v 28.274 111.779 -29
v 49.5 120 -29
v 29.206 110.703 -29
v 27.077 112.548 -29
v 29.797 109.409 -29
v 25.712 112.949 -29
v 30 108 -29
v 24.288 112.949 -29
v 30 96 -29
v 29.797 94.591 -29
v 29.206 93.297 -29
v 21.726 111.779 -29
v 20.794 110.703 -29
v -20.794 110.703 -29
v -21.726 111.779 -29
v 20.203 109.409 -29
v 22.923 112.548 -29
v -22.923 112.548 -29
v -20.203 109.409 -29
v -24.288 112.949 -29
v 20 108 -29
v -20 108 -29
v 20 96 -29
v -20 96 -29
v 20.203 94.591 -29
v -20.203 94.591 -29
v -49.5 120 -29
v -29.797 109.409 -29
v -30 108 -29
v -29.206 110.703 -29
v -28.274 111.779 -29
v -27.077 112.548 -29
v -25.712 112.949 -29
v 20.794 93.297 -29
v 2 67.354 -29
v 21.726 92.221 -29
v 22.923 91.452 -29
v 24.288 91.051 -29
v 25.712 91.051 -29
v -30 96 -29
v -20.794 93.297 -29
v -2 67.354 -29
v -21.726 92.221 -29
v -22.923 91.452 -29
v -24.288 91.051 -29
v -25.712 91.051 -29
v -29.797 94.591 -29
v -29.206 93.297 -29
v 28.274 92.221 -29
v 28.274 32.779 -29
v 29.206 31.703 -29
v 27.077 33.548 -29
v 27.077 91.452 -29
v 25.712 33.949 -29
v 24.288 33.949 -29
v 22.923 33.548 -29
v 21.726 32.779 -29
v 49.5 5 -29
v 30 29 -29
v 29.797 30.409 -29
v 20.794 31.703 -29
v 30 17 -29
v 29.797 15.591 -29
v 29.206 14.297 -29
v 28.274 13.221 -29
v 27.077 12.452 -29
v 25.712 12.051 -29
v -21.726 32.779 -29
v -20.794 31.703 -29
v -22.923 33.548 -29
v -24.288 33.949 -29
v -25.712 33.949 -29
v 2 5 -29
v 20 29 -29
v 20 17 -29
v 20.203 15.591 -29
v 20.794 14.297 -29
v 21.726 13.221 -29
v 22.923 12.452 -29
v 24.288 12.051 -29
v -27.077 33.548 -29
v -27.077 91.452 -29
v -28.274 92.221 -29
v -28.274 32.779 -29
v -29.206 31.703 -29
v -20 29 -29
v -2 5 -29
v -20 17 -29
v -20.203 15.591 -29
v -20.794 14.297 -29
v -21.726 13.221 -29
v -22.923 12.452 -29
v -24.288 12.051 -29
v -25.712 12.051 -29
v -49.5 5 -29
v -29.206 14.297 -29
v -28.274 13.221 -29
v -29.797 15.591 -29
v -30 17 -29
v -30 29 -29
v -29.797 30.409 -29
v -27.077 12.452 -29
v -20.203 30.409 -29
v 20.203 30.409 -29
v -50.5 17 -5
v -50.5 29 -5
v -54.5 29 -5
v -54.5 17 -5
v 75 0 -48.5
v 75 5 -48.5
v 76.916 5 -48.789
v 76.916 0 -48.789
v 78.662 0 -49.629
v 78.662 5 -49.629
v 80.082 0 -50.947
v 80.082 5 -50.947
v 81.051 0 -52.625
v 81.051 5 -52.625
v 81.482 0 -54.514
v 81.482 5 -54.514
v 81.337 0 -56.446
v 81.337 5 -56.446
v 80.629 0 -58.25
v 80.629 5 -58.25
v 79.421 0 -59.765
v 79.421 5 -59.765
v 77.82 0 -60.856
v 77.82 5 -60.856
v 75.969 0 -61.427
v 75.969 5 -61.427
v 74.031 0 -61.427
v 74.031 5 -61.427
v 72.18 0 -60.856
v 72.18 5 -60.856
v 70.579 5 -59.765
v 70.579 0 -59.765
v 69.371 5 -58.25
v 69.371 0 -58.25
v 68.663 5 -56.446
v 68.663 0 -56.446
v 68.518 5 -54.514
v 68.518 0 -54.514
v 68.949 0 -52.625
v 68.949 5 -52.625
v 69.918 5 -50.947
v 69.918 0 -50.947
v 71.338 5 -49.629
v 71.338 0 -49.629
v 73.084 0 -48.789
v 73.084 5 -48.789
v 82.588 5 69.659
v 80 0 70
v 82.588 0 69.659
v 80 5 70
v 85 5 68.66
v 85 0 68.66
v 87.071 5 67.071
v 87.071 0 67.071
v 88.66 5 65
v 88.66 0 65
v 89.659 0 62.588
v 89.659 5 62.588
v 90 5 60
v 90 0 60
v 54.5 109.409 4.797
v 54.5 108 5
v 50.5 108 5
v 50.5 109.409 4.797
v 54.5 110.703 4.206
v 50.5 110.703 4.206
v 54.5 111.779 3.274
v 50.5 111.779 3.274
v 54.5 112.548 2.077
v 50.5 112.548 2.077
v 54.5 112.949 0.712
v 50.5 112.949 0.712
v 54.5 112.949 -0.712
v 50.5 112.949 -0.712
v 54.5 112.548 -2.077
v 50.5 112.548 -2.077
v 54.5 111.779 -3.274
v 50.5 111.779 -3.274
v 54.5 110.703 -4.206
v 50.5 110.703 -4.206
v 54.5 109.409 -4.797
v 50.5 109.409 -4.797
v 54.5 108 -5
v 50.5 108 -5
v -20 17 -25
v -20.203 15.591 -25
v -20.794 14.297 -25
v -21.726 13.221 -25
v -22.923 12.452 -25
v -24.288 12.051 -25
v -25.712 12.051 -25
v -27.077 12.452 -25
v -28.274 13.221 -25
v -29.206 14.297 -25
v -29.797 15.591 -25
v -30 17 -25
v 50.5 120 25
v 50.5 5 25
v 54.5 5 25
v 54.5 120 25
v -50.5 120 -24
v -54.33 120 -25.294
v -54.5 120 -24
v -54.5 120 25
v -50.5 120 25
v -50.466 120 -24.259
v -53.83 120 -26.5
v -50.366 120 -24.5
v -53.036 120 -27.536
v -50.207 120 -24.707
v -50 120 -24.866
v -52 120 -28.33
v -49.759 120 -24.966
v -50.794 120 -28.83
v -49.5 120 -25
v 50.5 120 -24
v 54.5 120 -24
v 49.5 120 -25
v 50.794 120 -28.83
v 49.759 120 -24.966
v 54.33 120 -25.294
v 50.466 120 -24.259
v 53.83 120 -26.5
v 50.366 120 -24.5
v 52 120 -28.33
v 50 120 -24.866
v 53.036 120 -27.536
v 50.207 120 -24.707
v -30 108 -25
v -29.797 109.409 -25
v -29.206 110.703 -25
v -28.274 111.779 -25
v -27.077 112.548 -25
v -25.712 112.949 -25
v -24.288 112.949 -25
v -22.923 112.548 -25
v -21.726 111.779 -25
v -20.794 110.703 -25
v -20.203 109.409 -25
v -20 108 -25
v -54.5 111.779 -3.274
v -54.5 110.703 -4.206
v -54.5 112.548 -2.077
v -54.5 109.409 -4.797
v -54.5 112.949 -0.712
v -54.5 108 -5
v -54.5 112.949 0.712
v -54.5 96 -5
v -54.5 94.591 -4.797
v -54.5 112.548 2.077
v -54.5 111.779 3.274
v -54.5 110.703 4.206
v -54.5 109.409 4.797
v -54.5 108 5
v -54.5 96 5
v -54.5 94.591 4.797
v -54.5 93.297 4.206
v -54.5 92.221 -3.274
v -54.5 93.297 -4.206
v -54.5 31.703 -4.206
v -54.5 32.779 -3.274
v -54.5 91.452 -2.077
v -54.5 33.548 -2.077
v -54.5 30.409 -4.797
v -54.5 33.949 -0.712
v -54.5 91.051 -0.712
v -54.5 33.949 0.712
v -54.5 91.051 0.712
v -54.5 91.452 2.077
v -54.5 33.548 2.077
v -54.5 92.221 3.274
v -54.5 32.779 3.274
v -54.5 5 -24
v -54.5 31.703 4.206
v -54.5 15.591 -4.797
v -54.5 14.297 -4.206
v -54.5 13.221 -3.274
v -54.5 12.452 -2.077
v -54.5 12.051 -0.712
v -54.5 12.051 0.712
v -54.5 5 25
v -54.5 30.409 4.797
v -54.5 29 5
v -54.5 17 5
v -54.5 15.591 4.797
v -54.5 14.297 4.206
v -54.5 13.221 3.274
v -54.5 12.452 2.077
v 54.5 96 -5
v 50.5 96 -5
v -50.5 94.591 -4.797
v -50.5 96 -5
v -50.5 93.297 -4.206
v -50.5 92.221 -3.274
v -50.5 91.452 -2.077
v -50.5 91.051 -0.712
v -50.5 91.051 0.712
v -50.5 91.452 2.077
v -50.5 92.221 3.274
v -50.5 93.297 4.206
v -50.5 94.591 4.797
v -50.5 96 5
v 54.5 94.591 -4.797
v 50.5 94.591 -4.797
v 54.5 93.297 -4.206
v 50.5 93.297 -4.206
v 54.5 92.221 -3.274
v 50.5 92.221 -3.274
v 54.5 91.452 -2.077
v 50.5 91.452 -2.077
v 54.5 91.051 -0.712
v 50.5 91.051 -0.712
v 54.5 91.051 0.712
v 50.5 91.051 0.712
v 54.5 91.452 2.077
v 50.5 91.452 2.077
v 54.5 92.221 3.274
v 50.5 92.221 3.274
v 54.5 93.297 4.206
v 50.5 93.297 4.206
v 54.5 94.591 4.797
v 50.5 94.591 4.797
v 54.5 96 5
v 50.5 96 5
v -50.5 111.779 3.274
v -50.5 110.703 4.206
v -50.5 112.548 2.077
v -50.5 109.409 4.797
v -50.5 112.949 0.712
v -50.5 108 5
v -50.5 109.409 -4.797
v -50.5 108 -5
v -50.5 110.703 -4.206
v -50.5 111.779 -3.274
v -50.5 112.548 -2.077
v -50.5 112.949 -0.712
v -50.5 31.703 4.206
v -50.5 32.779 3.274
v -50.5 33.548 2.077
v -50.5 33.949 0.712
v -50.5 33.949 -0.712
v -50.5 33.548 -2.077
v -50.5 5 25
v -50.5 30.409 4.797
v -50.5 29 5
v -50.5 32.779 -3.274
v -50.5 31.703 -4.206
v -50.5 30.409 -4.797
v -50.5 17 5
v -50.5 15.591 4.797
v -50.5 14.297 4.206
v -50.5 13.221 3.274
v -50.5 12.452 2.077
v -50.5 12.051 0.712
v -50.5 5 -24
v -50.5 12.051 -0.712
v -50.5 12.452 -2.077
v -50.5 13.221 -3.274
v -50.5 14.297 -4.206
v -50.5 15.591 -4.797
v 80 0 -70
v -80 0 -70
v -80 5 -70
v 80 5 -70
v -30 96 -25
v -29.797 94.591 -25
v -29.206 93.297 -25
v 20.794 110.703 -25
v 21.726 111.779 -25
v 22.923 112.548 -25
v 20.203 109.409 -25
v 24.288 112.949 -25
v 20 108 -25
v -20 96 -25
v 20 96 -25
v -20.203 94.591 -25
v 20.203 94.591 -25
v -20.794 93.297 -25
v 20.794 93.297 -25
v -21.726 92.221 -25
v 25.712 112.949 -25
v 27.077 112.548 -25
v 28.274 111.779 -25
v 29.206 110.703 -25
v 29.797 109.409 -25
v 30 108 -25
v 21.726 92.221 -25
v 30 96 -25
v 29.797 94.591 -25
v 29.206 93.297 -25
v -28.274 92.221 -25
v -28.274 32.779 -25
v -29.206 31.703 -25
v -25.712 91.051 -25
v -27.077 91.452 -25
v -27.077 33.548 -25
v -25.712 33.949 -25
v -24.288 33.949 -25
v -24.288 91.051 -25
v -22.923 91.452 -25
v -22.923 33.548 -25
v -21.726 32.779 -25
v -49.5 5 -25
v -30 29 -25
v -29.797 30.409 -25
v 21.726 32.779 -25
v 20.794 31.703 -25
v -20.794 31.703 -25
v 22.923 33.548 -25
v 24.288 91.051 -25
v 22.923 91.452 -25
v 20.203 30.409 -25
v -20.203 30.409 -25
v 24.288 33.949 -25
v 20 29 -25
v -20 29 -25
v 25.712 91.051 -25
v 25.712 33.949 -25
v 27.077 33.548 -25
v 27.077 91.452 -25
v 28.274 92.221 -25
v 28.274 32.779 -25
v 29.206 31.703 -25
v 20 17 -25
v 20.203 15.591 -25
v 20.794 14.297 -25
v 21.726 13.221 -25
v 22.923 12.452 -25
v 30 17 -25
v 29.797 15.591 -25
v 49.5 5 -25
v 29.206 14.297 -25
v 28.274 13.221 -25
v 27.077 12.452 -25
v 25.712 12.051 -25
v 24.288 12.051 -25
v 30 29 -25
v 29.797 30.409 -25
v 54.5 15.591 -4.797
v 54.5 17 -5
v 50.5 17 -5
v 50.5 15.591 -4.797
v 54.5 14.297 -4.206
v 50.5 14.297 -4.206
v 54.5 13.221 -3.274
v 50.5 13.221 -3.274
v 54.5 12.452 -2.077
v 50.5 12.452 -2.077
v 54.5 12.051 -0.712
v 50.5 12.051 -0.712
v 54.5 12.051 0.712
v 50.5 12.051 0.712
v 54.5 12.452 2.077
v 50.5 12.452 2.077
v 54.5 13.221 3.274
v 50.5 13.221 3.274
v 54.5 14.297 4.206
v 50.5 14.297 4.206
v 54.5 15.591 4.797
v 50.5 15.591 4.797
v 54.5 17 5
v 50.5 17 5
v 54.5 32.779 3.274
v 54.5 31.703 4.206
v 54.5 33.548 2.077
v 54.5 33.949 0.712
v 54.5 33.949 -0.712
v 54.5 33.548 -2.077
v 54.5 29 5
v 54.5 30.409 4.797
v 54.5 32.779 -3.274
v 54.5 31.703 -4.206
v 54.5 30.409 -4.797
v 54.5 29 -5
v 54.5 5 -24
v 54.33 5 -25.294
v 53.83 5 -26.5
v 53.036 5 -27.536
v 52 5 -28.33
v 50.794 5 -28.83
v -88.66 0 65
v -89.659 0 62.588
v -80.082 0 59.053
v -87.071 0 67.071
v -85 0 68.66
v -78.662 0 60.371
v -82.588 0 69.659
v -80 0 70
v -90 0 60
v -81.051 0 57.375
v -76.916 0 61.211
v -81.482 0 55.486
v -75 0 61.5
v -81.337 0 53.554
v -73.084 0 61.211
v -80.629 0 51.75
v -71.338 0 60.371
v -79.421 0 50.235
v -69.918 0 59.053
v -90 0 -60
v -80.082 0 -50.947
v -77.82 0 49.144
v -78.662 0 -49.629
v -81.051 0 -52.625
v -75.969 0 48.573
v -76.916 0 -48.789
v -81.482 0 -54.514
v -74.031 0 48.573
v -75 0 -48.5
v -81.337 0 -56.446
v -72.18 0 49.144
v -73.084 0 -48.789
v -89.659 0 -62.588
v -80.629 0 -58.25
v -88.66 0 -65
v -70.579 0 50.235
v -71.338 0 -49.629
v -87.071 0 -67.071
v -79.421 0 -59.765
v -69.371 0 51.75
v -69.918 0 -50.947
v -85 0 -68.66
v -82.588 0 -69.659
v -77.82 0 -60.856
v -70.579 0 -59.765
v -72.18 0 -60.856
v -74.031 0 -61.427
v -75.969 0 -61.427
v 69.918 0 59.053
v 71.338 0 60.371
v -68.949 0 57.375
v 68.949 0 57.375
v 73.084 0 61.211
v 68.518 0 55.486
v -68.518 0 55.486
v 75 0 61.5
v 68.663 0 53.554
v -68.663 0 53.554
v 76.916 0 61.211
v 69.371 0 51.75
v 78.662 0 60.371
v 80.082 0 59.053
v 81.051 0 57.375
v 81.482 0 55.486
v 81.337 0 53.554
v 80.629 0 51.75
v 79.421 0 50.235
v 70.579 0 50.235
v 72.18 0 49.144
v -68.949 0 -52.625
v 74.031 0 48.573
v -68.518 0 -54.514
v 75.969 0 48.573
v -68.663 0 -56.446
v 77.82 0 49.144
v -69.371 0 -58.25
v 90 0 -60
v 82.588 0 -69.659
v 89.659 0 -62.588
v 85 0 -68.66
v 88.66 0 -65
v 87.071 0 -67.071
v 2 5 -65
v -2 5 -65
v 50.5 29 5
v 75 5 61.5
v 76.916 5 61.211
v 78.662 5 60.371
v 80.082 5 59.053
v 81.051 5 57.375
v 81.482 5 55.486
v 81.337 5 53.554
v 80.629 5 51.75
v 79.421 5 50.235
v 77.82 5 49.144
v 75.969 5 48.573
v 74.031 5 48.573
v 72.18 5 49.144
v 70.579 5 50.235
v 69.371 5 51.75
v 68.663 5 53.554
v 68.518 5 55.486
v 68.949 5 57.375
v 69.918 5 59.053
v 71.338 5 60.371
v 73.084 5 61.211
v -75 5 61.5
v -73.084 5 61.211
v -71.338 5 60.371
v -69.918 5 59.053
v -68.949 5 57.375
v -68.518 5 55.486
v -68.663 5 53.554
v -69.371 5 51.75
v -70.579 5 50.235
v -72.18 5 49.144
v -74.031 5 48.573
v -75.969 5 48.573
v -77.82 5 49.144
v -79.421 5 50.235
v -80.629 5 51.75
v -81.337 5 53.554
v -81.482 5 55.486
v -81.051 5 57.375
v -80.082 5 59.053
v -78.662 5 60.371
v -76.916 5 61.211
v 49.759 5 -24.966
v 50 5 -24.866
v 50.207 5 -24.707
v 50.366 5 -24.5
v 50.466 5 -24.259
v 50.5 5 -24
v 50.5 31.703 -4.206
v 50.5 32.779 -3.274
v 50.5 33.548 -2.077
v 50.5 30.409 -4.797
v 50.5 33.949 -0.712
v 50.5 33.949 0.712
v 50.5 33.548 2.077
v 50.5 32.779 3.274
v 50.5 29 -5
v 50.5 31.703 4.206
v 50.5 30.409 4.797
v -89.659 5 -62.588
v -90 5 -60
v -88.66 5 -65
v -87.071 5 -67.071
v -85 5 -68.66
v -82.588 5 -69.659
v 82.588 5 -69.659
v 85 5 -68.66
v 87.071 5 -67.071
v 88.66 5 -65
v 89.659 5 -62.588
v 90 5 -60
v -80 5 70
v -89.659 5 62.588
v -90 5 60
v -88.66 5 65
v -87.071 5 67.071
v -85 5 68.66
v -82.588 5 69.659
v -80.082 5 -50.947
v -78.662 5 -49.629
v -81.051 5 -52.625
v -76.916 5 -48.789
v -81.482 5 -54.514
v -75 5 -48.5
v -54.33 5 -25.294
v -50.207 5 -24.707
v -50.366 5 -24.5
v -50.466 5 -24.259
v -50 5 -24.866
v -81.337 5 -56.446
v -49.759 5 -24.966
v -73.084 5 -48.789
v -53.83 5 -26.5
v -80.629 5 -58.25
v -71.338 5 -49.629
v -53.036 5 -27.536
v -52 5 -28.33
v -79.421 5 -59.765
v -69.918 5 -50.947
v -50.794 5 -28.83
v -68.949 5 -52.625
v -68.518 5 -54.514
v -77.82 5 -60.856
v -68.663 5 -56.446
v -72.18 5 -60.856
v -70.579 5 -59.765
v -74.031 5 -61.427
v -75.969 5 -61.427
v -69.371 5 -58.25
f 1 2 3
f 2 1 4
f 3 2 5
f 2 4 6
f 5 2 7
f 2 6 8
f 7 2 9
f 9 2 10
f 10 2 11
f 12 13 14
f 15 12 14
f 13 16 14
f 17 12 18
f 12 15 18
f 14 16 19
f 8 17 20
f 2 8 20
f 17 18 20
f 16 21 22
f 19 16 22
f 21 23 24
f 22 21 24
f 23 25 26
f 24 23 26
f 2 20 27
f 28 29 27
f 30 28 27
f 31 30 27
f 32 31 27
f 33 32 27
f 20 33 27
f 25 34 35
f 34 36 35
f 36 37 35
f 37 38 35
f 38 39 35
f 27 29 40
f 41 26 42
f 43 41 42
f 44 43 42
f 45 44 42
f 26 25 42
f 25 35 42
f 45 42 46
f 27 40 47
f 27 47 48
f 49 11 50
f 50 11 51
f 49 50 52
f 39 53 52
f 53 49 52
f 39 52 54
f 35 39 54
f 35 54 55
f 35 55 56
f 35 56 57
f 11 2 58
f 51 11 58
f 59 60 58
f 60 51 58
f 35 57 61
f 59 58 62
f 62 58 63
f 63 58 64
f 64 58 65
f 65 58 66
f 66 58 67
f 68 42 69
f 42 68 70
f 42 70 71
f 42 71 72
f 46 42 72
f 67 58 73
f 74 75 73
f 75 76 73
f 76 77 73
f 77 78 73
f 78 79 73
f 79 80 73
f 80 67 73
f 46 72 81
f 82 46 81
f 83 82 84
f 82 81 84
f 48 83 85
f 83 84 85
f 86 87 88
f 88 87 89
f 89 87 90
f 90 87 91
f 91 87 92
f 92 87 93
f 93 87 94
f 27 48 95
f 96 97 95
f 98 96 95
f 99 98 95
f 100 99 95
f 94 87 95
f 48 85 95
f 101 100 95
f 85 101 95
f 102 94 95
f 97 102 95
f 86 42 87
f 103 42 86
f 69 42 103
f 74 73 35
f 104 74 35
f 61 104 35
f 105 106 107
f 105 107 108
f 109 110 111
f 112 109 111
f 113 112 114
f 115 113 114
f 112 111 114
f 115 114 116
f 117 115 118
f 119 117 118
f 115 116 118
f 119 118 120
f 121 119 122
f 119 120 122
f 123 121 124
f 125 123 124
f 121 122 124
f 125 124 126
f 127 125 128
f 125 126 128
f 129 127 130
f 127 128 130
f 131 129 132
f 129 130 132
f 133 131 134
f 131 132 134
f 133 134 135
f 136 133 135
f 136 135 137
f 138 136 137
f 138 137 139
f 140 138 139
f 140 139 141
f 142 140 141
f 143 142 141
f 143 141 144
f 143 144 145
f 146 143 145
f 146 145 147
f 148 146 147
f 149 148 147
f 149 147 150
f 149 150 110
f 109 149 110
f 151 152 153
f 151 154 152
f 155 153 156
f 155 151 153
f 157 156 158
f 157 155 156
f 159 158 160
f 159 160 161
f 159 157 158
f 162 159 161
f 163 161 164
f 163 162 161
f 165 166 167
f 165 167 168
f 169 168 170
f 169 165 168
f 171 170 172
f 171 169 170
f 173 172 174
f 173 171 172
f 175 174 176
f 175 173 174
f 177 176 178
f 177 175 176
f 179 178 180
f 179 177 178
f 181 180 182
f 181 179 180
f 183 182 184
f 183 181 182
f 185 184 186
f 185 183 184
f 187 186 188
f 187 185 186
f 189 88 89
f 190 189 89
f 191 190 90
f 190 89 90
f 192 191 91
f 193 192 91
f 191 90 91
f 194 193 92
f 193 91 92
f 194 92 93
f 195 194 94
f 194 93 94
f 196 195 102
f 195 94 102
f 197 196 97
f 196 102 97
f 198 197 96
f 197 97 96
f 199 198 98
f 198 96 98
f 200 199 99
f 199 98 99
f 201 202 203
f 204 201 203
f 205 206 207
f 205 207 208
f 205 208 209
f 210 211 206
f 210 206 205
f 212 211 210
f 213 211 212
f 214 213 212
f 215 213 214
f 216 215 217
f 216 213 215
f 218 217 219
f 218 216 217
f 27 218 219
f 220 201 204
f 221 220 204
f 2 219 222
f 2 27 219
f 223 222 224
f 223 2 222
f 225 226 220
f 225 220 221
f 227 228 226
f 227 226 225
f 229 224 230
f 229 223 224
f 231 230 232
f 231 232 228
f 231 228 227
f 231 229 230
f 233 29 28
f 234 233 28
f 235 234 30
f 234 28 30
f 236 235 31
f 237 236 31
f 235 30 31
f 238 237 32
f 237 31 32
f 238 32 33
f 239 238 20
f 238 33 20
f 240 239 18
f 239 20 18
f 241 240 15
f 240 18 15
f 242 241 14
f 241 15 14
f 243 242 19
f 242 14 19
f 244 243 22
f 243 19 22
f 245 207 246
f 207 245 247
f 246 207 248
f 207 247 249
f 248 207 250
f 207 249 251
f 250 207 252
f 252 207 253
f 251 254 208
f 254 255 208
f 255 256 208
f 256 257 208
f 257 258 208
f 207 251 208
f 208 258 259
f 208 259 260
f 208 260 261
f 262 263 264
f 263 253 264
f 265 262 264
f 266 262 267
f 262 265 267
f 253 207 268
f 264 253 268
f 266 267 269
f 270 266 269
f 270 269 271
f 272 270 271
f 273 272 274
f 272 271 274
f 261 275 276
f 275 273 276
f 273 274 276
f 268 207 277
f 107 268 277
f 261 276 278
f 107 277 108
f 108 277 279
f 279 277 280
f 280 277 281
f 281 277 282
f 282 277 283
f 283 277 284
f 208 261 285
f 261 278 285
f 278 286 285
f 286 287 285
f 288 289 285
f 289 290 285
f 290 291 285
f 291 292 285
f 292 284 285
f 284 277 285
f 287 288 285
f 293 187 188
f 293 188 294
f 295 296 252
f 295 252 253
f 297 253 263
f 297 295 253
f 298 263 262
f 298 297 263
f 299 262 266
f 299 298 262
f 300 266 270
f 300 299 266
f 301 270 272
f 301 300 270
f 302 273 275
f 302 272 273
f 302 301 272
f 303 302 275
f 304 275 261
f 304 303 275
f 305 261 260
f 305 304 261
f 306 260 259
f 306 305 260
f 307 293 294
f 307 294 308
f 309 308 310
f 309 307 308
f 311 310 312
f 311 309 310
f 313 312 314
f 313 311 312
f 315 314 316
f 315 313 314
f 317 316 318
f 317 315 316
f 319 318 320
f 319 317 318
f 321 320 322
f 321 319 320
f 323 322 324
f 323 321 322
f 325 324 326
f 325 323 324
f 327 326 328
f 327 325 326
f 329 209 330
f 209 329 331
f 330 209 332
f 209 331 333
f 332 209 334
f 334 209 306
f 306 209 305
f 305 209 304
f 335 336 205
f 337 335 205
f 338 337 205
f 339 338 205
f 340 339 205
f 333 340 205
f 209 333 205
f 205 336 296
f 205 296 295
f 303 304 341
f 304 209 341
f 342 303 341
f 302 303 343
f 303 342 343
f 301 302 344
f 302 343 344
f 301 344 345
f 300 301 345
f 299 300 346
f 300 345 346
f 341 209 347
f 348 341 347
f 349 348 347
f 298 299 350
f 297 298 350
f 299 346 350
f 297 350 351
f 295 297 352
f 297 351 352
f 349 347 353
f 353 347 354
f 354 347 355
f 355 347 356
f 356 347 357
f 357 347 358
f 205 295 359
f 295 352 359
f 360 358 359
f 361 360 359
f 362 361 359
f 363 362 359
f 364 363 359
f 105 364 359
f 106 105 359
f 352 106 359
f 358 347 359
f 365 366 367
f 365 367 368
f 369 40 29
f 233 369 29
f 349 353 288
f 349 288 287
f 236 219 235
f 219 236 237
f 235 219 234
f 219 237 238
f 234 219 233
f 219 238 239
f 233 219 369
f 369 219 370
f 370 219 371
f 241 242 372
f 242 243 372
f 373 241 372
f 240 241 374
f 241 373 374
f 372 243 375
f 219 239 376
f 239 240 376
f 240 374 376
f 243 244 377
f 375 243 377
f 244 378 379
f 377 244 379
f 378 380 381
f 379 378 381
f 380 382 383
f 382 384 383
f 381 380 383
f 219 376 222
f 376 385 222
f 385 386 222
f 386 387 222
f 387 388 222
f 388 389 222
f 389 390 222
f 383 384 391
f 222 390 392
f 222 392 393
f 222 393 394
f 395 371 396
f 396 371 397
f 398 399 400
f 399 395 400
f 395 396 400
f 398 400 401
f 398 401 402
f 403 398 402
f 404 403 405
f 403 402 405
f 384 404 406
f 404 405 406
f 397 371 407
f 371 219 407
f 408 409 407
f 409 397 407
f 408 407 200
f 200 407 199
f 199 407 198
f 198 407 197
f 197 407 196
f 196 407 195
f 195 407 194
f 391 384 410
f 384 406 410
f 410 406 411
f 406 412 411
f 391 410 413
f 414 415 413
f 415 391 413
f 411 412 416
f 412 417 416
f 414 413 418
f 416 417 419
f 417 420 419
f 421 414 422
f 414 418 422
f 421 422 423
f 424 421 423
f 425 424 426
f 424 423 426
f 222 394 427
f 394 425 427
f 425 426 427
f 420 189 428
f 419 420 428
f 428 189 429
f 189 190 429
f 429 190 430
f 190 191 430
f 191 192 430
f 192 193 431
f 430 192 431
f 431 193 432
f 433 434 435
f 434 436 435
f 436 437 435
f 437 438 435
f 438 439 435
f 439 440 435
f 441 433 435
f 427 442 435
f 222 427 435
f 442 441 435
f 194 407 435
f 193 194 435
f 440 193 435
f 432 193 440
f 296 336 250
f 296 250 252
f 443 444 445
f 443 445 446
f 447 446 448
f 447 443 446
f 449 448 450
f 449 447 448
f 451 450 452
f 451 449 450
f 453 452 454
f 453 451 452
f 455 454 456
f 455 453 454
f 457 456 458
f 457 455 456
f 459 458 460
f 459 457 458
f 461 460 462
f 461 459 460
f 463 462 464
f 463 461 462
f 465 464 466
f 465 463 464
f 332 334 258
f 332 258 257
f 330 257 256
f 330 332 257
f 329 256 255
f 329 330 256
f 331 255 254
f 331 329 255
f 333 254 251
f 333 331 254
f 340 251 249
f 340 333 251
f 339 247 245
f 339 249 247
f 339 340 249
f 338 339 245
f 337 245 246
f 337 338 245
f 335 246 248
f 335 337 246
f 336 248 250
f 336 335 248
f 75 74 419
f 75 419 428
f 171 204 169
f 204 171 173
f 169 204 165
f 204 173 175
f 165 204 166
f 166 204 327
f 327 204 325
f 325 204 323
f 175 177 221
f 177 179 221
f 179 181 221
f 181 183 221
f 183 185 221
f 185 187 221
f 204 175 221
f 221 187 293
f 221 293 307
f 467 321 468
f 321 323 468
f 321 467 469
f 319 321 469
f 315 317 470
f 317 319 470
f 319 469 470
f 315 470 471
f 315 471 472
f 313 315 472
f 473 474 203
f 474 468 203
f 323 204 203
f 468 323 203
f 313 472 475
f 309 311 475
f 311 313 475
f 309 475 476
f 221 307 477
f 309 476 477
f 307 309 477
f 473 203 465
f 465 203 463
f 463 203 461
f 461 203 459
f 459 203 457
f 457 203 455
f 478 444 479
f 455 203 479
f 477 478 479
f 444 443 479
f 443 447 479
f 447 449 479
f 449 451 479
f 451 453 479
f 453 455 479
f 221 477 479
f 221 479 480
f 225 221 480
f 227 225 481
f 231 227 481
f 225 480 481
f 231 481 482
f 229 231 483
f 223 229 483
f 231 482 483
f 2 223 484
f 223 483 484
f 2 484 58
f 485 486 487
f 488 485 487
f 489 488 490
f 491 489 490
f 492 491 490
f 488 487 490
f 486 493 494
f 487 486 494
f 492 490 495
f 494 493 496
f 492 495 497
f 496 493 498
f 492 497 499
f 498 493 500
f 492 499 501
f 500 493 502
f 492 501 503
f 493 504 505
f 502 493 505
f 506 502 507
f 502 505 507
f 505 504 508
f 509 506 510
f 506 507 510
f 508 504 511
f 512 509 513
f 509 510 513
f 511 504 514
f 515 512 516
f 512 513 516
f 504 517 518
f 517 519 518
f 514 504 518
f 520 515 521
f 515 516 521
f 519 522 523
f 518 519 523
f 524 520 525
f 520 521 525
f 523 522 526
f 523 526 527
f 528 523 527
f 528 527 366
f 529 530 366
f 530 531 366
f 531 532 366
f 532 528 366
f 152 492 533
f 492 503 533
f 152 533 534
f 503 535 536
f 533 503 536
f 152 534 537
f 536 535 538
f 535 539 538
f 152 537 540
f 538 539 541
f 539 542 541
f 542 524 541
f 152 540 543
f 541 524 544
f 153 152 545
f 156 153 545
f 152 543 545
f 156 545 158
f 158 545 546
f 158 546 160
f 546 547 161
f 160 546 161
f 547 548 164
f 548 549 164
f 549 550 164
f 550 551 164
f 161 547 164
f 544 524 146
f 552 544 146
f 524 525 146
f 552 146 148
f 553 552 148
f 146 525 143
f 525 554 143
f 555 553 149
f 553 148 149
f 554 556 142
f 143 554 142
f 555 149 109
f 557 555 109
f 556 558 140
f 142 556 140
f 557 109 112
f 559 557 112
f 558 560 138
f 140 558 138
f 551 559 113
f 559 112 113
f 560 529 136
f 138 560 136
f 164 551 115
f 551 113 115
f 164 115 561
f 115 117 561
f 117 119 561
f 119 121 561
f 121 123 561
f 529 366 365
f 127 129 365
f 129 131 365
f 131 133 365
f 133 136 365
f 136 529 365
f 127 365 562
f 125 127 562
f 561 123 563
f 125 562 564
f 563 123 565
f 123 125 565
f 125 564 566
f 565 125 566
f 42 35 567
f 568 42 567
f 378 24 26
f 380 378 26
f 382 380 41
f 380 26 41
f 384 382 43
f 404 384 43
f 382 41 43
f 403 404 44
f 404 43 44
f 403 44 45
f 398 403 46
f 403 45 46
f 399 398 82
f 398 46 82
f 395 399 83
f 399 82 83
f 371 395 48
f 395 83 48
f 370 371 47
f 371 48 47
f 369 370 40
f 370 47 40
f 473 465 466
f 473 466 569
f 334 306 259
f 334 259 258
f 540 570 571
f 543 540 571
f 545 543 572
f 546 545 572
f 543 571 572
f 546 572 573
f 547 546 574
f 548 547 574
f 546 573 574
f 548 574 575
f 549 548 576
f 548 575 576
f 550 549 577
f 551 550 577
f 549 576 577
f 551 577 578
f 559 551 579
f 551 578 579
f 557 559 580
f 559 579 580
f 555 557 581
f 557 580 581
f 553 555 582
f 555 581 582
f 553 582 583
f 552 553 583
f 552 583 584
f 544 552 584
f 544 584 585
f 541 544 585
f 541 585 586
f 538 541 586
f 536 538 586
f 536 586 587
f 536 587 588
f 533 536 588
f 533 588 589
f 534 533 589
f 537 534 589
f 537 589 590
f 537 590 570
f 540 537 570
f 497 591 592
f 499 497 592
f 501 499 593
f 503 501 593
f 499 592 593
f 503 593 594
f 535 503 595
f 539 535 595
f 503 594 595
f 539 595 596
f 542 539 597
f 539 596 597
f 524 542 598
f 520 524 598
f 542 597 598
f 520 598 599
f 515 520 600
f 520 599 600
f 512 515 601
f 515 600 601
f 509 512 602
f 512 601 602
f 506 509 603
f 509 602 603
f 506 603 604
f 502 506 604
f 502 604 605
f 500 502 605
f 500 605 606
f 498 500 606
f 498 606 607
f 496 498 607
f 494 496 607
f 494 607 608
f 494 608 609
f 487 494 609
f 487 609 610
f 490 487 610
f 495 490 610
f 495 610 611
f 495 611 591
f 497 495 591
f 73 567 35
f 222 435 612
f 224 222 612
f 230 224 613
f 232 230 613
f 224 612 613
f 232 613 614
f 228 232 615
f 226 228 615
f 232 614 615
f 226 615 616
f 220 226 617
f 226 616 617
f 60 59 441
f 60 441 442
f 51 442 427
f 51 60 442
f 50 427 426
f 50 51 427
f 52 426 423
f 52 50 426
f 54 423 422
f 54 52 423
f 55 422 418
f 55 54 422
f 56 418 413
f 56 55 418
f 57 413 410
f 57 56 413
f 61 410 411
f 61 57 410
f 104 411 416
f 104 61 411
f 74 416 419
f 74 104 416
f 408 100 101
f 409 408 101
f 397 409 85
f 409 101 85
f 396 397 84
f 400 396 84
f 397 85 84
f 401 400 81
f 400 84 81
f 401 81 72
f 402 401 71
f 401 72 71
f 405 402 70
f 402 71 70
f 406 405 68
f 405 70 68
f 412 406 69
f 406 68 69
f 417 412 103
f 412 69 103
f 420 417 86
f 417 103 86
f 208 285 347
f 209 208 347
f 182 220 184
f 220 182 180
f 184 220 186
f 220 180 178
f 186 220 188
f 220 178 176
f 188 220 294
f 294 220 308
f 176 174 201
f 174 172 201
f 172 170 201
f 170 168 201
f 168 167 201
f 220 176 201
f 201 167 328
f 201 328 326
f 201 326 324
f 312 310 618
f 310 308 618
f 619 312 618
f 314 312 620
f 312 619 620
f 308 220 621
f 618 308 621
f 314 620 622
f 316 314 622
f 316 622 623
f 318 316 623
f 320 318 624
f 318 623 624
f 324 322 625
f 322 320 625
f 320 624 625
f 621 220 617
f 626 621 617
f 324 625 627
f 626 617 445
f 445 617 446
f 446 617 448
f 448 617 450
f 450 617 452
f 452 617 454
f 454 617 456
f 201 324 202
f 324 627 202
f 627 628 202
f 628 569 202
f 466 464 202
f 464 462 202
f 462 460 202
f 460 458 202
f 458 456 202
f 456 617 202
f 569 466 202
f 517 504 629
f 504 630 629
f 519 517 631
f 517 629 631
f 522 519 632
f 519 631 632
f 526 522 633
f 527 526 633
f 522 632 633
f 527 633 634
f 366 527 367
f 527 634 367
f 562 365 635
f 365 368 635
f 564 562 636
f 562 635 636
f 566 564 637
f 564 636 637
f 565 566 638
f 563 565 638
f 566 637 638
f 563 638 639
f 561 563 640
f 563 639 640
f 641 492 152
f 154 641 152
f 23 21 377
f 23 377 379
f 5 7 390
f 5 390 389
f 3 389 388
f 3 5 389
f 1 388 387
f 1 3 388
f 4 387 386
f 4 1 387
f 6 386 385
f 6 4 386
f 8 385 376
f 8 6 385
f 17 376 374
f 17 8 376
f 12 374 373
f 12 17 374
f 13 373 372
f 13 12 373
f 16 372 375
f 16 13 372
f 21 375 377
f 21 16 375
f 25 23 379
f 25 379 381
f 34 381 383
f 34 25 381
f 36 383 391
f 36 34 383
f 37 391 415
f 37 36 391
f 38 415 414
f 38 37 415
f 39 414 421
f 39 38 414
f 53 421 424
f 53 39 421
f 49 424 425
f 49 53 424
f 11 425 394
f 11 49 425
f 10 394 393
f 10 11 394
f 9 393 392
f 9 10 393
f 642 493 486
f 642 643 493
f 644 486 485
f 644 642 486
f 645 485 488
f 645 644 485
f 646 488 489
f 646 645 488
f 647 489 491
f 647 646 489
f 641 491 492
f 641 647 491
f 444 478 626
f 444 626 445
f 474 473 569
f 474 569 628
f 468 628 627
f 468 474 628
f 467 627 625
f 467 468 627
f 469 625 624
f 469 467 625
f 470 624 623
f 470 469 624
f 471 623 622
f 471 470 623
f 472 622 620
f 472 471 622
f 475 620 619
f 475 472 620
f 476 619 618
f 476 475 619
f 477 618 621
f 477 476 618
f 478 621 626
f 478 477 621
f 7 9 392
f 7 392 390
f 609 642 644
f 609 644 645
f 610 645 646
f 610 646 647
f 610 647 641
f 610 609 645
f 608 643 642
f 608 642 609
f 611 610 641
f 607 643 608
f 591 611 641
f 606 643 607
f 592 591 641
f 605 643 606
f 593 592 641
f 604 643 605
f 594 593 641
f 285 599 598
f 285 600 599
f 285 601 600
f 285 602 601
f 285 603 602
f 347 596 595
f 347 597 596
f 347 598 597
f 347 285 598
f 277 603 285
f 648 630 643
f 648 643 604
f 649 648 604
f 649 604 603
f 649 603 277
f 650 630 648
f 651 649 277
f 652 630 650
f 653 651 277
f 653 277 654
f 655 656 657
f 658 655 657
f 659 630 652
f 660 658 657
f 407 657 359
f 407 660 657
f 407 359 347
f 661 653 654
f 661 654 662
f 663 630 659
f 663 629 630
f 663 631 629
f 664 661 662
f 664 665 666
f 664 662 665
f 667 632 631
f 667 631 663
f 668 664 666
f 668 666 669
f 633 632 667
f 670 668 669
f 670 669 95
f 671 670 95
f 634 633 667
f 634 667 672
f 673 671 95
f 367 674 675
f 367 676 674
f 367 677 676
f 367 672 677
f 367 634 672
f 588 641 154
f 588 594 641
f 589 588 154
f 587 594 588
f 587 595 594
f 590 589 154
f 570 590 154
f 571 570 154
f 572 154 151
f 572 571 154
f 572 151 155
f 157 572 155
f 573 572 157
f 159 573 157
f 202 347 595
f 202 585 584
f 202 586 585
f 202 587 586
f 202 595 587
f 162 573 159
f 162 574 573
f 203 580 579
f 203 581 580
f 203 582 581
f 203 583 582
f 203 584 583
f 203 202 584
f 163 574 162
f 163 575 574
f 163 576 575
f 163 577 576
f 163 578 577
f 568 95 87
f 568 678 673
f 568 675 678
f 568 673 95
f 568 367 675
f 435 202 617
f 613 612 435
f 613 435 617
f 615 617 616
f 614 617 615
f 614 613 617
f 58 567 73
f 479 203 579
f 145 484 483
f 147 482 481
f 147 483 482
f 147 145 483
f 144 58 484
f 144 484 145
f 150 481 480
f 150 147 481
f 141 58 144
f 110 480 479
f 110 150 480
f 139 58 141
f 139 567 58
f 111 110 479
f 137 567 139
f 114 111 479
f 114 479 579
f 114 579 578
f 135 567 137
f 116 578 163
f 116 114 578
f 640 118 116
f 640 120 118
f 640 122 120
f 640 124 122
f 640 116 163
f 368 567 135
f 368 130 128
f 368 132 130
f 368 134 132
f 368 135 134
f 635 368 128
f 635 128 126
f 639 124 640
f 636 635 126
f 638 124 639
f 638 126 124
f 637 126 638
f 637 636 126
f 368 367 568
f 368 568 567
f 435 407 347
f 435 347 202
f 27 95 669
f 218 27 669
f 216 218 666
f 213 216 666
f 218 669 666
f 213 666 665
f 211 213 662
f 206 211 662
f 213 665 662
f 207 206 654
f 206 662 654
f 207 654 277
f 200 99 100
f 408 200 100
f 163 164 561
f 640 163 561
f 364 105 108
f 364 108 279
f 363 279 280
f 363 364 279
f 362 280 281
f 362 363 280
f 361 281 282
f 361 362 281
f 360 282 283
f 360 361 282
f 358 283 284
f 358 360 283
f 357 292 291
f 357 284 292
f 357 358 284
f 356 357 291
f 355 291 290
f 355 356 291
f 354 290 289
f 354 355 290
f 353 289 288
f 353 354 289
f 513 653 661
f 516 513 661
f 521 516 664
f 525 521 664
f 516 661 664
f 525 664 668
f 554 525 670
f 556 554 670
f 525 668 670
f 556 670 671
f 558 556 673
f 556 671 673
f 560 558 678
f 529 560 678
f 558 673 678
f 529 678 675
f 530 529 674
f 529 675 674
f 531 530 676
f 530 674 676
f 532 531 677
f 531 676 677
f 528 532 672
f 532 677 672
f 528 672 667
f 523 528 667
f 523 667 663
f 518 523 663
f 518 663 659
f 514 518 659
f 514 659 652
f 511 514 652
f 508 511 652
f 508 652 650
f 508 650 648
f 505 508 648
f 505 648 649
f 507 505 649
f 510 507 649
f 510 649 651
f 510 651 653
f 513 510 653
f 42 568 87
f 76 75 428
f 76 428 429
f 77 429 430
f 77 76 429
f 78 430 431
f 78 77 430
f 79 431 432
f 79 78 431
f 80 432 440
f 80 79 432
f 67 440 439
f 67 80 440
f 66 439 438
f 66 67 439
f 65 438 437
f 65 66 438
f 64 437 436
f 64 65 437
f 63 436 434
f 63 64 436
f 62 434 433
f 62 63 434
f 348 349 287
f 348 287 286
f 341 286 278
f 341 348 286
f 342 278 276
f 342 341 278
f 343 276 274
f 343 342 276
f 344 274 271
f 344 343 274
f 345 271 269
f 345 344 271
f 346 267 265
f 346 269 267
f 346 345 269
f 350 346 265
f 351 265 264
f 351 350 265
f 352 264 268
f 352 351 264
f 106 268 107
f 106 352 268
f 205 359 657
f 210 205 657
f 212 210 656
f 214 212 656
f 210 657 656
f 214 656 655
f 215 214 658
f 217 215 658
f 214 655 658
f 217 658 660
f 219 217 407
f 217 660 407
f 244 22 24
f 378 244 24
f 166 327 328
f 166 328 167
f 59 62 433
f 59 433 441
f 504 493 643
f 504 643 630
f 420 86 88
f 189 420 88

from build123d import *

# Parameters (mm, degrees)
SKETCH_2_W          = 180
SKETCH_2_H          = 140
EXTRUDE_1_DEPTH     = 5
EXTRUDE_1_2_DEPTH   = 115
EXTRUDE_2_DEPTH     = 2
CUT_EXTRUDE_1_DEPTH = 145.5
SKETCH_6_R          = 6.5
CUT_EXTRUDE_2_DEPTH = 6
FILLET_1_R          = 10
CUT_EXTRUDE_3_REACH = 101


with BuildPart() as part:
    # Эскиз2 → Extrude 1 (new body)
    with BuildSketch(Plane(origin=(0, 0, 0), x_dir=(1, 0, 0), z_dir=(0, 1, 0))):
        Rectangle(SKETCH_2_W, SKETCH_2_H)
    extrude(amount=EXTRUDE_1_DEPTH)

    # Эскиз3 → Extrude 1 2 (add)
    with BuildSketch(Plane(origin=(0, 5, 0), x_dir=(1, 0, 0), z_dir=(0, 1, 0))):
        with BuildLine():
            Line((-50.5, -25), (-50.5, 24))
            ThreePointArc((-50.5, 24), (-50.207106781, 24.707106781), (-49.5, 25))
            Line((-49.5, 25), (49.5, 25))
            ThreePointArc((49.5, 25), (50.207106781, 24.707106781), (50.5, 24))
            Line((50.5, 24), (50.5, -25))
            Line((50.5, -25), (54.5, -25))
            Line((54.5, -25), (54.5, 24))
            ThreePointArc((54.5, 24), (53.035533906, 27.535533906), (49.5, 29))
            Line((49.5, 29), (-49.5, 29))
            ThreePointArc((-49.5, 29), (-53.035533906, 27.535533906), (-54.5, 24))
            Line((-54.5, 24), (-54.5, -25))
            Line((-54.5, -25), (-50.5, -25))
        make_face()
    extrude(amount=EXTRUDE_1_2_DEPTH)

    # Эскиз4 → Бобышка-Вытянуть2 (add, symmetric)
    with BuildSketch(Plane(origin=(0, 0, 0), x_dir=(0, 0, -1), z_dir=(1, 0, 0))):
        Polygon((29, 67.353829072), (65, 5), (29, 5), align=None)
    extrude(amount=EXTRUDE_2_DEPTH, both=True)

    # Эскиз5 → Вырез-Вытянуть1 (cut, through all)
    with BuildSketch(Plane(origin=(54.5, 0, 0), x_dir=(0, 0, -1), z_dir=(1, 0, 0))):
        with BuildLine():
            Line((5, 108), (5, 96))
            ThreePointArc((5, 96), (0, 91), (-5, 96))
            Line((-5, 96), (-5, 108))
            ThreePointArc((-5, 108), (0, 113), (5, 108))
        make_face()
        with BuildLine():
            Line((5, 29), (5, 17))
            ThreePointArc((5, 17), (0, 12), (-5, 17))
            Line((-5, 17), (-5, 29))
            ThreePointArc((-5, 29), (0, 34), (5, 29))
        make_face()
    extrude(amount=-CUT_EXTRUDE_1_DEPTH, mode=Mode.SUBTRACT)

    # Эскиз6 → Вырез-Вытянуть2 (cut, through all)
    with BuildSketch(Plane(origin=(0, 5, 0), x_dir=(1, 0, 0), z_dir=(0, 1, 0))):
        with Locations(Location((-75, 55, 0), (0, 0, 270))):  # turned: the seam where the file's is
            Circle(SKETCH_6_R)
        with Locations(Location((-75, -55, 0), (0, 0, 270))):  # turned: the seam where the file's is
            Circle(SKETCH_6_R)
        with Locations(Location((75, 55, 0), (0, 0, 270))):  # turned: the seam where the file's is
            Circle(SKETCH_6_R)
        with Locations(Location((75, -55, 0), (0, 0, 270))):  # turned: the seam where the file's is
            Circle(SKETCH_6_R)
    extrude(amount=-CUT_EXTRUDE_2_DEPTH, mode=Mode.SUBTRACT)

    # Скругление1
    fillet_1_edges = [part.edges().sort_by_distance(p)[0] for p in [
        (90, 2.5, 70),
        (-90, 2.5, 70),
        (-90, 2.5, -70),
        (90, 2.5, -70),
    ]]
    fillet(fillet_1_edges, radius=FILLET_1_R)

    # Эскиз8 → Вырез-Вытянуть3 (cut, up to next)
    with BuildSketch(Plane(origin=(0, 0, -29), x_dir=(-1, 0, 0), z_dir=(0, 0, -1)), mode=Mode.PRIVATE) as cut_extrude_3_sk1:
        with BuildLine():
            Line((-20, 108), (-20, 96))
            ThreePointArc((-20, 96), (-25, 91), (-30, 96))
            Line((-30, 96), (-30, 108))
            ThreePointArc((-30, 108), (-25, 113), (-20, 108))
        make_face()
    cut_extrude_3_tool1 = extrude(cut_extrude_3_sk1.sketch, amount=-CUT_EXTRUDE_3_REACH, mode=Mode.PRIVATE) & part.part
    add(cut_extrude_3_tool1.solids().sort_by_distance((25, 102, -29))[0], mode=Mode.SUBTRACT)
    # Эскиз8 → Вырез-Вытянуть3 (cut, up to next)
    with BuildSketch(Plane(origin=(0, 0, -29), x_dir=(-1, 0, 0), z_dir=(0, 0, -1)), mode=Mode.PRIVATE) as cut_extrude_3_sk2:
        with BuildLine():
            Line((-20, 29), (-20, 17))
            ThreePointArc((-20, 17), (-25, 12), (-30, 17))
            Line((-30, 17), (-30, 29))
            ThreePointArc((-30, 29), (-25, 34), (-20, 29))
        make_face()
    cut_extrude_3_tool2 = extrude(cut_extrude_3_sk2.sketch, amount=-CUT_EXTRUDE_3_REACH, mode=Mode.PRIVATE) & part.part
    add(cut_extrude_3_tool2.solids().sort_by_distance((25, 23, -29))[0], mode=Mode.SUBTRACT)
    # Эскиз8 → Вырез-Вытянуть3 (cut, up to next)
    with BuildSketch(Plane(origin=(0, 0, -29), x_dir=(-1, 0, 0), z_dir=(0, 0, -1)), mode=Mode.PRIVATE) as cut_extrude_3_sk3:
        with BuildLine():
            Line((20, 108), (20, 96))
            ThreePointArc((20, 96), (25, 91), (30, 96))
            Line((30, 96), (30, 108))
            ThreePointArc((30, 108), (25, 113), (20, 108))
        make_face()
    cut_extrude_3_tool3 = extrude(cut_extrude_3_sk3.sketch, amount=-CUT_EXTRUDE_3_REACH, mode=Mode.PRIVATE) & part.part
    add(cut_extrude_3_tool3.solids().sort_by_distance((-25, 102, -29))[0], mode=Mode.SUBTRACT)
    # Эскиз8 → Вырез-Вытянуть3 (cut, up to next)
    with BuildSketch(Plane(origin=(0, 0, -29), x_dir=(-1, 0, 0), z_dir=(0, 0, -1)), mode=Mode.PRIVATE) as cut_extrude_3_sk4:
        with BuildLine():
            Line((20, 29), (20, 17))
            ThreePointArc((20, 17), (25, 12), (30, 17))
            Line((30, 17), (30, 29))
            ThreePointArc((30, 29), (25, 34), (20, 29))
        make_face()
    cut_extrude_3_tool4 = extrude(cut_extrude_3_sk4.sketch, amount=-CUT_EXTRUDE_3_REACH, mode=Mode.PRIVATE) & part.part
    add(cut_extrude_3_tool4.solids().sort_by_distance((-25, 23, -29))[0], mode=Mode.SUBTRACT)


solid = part.part
